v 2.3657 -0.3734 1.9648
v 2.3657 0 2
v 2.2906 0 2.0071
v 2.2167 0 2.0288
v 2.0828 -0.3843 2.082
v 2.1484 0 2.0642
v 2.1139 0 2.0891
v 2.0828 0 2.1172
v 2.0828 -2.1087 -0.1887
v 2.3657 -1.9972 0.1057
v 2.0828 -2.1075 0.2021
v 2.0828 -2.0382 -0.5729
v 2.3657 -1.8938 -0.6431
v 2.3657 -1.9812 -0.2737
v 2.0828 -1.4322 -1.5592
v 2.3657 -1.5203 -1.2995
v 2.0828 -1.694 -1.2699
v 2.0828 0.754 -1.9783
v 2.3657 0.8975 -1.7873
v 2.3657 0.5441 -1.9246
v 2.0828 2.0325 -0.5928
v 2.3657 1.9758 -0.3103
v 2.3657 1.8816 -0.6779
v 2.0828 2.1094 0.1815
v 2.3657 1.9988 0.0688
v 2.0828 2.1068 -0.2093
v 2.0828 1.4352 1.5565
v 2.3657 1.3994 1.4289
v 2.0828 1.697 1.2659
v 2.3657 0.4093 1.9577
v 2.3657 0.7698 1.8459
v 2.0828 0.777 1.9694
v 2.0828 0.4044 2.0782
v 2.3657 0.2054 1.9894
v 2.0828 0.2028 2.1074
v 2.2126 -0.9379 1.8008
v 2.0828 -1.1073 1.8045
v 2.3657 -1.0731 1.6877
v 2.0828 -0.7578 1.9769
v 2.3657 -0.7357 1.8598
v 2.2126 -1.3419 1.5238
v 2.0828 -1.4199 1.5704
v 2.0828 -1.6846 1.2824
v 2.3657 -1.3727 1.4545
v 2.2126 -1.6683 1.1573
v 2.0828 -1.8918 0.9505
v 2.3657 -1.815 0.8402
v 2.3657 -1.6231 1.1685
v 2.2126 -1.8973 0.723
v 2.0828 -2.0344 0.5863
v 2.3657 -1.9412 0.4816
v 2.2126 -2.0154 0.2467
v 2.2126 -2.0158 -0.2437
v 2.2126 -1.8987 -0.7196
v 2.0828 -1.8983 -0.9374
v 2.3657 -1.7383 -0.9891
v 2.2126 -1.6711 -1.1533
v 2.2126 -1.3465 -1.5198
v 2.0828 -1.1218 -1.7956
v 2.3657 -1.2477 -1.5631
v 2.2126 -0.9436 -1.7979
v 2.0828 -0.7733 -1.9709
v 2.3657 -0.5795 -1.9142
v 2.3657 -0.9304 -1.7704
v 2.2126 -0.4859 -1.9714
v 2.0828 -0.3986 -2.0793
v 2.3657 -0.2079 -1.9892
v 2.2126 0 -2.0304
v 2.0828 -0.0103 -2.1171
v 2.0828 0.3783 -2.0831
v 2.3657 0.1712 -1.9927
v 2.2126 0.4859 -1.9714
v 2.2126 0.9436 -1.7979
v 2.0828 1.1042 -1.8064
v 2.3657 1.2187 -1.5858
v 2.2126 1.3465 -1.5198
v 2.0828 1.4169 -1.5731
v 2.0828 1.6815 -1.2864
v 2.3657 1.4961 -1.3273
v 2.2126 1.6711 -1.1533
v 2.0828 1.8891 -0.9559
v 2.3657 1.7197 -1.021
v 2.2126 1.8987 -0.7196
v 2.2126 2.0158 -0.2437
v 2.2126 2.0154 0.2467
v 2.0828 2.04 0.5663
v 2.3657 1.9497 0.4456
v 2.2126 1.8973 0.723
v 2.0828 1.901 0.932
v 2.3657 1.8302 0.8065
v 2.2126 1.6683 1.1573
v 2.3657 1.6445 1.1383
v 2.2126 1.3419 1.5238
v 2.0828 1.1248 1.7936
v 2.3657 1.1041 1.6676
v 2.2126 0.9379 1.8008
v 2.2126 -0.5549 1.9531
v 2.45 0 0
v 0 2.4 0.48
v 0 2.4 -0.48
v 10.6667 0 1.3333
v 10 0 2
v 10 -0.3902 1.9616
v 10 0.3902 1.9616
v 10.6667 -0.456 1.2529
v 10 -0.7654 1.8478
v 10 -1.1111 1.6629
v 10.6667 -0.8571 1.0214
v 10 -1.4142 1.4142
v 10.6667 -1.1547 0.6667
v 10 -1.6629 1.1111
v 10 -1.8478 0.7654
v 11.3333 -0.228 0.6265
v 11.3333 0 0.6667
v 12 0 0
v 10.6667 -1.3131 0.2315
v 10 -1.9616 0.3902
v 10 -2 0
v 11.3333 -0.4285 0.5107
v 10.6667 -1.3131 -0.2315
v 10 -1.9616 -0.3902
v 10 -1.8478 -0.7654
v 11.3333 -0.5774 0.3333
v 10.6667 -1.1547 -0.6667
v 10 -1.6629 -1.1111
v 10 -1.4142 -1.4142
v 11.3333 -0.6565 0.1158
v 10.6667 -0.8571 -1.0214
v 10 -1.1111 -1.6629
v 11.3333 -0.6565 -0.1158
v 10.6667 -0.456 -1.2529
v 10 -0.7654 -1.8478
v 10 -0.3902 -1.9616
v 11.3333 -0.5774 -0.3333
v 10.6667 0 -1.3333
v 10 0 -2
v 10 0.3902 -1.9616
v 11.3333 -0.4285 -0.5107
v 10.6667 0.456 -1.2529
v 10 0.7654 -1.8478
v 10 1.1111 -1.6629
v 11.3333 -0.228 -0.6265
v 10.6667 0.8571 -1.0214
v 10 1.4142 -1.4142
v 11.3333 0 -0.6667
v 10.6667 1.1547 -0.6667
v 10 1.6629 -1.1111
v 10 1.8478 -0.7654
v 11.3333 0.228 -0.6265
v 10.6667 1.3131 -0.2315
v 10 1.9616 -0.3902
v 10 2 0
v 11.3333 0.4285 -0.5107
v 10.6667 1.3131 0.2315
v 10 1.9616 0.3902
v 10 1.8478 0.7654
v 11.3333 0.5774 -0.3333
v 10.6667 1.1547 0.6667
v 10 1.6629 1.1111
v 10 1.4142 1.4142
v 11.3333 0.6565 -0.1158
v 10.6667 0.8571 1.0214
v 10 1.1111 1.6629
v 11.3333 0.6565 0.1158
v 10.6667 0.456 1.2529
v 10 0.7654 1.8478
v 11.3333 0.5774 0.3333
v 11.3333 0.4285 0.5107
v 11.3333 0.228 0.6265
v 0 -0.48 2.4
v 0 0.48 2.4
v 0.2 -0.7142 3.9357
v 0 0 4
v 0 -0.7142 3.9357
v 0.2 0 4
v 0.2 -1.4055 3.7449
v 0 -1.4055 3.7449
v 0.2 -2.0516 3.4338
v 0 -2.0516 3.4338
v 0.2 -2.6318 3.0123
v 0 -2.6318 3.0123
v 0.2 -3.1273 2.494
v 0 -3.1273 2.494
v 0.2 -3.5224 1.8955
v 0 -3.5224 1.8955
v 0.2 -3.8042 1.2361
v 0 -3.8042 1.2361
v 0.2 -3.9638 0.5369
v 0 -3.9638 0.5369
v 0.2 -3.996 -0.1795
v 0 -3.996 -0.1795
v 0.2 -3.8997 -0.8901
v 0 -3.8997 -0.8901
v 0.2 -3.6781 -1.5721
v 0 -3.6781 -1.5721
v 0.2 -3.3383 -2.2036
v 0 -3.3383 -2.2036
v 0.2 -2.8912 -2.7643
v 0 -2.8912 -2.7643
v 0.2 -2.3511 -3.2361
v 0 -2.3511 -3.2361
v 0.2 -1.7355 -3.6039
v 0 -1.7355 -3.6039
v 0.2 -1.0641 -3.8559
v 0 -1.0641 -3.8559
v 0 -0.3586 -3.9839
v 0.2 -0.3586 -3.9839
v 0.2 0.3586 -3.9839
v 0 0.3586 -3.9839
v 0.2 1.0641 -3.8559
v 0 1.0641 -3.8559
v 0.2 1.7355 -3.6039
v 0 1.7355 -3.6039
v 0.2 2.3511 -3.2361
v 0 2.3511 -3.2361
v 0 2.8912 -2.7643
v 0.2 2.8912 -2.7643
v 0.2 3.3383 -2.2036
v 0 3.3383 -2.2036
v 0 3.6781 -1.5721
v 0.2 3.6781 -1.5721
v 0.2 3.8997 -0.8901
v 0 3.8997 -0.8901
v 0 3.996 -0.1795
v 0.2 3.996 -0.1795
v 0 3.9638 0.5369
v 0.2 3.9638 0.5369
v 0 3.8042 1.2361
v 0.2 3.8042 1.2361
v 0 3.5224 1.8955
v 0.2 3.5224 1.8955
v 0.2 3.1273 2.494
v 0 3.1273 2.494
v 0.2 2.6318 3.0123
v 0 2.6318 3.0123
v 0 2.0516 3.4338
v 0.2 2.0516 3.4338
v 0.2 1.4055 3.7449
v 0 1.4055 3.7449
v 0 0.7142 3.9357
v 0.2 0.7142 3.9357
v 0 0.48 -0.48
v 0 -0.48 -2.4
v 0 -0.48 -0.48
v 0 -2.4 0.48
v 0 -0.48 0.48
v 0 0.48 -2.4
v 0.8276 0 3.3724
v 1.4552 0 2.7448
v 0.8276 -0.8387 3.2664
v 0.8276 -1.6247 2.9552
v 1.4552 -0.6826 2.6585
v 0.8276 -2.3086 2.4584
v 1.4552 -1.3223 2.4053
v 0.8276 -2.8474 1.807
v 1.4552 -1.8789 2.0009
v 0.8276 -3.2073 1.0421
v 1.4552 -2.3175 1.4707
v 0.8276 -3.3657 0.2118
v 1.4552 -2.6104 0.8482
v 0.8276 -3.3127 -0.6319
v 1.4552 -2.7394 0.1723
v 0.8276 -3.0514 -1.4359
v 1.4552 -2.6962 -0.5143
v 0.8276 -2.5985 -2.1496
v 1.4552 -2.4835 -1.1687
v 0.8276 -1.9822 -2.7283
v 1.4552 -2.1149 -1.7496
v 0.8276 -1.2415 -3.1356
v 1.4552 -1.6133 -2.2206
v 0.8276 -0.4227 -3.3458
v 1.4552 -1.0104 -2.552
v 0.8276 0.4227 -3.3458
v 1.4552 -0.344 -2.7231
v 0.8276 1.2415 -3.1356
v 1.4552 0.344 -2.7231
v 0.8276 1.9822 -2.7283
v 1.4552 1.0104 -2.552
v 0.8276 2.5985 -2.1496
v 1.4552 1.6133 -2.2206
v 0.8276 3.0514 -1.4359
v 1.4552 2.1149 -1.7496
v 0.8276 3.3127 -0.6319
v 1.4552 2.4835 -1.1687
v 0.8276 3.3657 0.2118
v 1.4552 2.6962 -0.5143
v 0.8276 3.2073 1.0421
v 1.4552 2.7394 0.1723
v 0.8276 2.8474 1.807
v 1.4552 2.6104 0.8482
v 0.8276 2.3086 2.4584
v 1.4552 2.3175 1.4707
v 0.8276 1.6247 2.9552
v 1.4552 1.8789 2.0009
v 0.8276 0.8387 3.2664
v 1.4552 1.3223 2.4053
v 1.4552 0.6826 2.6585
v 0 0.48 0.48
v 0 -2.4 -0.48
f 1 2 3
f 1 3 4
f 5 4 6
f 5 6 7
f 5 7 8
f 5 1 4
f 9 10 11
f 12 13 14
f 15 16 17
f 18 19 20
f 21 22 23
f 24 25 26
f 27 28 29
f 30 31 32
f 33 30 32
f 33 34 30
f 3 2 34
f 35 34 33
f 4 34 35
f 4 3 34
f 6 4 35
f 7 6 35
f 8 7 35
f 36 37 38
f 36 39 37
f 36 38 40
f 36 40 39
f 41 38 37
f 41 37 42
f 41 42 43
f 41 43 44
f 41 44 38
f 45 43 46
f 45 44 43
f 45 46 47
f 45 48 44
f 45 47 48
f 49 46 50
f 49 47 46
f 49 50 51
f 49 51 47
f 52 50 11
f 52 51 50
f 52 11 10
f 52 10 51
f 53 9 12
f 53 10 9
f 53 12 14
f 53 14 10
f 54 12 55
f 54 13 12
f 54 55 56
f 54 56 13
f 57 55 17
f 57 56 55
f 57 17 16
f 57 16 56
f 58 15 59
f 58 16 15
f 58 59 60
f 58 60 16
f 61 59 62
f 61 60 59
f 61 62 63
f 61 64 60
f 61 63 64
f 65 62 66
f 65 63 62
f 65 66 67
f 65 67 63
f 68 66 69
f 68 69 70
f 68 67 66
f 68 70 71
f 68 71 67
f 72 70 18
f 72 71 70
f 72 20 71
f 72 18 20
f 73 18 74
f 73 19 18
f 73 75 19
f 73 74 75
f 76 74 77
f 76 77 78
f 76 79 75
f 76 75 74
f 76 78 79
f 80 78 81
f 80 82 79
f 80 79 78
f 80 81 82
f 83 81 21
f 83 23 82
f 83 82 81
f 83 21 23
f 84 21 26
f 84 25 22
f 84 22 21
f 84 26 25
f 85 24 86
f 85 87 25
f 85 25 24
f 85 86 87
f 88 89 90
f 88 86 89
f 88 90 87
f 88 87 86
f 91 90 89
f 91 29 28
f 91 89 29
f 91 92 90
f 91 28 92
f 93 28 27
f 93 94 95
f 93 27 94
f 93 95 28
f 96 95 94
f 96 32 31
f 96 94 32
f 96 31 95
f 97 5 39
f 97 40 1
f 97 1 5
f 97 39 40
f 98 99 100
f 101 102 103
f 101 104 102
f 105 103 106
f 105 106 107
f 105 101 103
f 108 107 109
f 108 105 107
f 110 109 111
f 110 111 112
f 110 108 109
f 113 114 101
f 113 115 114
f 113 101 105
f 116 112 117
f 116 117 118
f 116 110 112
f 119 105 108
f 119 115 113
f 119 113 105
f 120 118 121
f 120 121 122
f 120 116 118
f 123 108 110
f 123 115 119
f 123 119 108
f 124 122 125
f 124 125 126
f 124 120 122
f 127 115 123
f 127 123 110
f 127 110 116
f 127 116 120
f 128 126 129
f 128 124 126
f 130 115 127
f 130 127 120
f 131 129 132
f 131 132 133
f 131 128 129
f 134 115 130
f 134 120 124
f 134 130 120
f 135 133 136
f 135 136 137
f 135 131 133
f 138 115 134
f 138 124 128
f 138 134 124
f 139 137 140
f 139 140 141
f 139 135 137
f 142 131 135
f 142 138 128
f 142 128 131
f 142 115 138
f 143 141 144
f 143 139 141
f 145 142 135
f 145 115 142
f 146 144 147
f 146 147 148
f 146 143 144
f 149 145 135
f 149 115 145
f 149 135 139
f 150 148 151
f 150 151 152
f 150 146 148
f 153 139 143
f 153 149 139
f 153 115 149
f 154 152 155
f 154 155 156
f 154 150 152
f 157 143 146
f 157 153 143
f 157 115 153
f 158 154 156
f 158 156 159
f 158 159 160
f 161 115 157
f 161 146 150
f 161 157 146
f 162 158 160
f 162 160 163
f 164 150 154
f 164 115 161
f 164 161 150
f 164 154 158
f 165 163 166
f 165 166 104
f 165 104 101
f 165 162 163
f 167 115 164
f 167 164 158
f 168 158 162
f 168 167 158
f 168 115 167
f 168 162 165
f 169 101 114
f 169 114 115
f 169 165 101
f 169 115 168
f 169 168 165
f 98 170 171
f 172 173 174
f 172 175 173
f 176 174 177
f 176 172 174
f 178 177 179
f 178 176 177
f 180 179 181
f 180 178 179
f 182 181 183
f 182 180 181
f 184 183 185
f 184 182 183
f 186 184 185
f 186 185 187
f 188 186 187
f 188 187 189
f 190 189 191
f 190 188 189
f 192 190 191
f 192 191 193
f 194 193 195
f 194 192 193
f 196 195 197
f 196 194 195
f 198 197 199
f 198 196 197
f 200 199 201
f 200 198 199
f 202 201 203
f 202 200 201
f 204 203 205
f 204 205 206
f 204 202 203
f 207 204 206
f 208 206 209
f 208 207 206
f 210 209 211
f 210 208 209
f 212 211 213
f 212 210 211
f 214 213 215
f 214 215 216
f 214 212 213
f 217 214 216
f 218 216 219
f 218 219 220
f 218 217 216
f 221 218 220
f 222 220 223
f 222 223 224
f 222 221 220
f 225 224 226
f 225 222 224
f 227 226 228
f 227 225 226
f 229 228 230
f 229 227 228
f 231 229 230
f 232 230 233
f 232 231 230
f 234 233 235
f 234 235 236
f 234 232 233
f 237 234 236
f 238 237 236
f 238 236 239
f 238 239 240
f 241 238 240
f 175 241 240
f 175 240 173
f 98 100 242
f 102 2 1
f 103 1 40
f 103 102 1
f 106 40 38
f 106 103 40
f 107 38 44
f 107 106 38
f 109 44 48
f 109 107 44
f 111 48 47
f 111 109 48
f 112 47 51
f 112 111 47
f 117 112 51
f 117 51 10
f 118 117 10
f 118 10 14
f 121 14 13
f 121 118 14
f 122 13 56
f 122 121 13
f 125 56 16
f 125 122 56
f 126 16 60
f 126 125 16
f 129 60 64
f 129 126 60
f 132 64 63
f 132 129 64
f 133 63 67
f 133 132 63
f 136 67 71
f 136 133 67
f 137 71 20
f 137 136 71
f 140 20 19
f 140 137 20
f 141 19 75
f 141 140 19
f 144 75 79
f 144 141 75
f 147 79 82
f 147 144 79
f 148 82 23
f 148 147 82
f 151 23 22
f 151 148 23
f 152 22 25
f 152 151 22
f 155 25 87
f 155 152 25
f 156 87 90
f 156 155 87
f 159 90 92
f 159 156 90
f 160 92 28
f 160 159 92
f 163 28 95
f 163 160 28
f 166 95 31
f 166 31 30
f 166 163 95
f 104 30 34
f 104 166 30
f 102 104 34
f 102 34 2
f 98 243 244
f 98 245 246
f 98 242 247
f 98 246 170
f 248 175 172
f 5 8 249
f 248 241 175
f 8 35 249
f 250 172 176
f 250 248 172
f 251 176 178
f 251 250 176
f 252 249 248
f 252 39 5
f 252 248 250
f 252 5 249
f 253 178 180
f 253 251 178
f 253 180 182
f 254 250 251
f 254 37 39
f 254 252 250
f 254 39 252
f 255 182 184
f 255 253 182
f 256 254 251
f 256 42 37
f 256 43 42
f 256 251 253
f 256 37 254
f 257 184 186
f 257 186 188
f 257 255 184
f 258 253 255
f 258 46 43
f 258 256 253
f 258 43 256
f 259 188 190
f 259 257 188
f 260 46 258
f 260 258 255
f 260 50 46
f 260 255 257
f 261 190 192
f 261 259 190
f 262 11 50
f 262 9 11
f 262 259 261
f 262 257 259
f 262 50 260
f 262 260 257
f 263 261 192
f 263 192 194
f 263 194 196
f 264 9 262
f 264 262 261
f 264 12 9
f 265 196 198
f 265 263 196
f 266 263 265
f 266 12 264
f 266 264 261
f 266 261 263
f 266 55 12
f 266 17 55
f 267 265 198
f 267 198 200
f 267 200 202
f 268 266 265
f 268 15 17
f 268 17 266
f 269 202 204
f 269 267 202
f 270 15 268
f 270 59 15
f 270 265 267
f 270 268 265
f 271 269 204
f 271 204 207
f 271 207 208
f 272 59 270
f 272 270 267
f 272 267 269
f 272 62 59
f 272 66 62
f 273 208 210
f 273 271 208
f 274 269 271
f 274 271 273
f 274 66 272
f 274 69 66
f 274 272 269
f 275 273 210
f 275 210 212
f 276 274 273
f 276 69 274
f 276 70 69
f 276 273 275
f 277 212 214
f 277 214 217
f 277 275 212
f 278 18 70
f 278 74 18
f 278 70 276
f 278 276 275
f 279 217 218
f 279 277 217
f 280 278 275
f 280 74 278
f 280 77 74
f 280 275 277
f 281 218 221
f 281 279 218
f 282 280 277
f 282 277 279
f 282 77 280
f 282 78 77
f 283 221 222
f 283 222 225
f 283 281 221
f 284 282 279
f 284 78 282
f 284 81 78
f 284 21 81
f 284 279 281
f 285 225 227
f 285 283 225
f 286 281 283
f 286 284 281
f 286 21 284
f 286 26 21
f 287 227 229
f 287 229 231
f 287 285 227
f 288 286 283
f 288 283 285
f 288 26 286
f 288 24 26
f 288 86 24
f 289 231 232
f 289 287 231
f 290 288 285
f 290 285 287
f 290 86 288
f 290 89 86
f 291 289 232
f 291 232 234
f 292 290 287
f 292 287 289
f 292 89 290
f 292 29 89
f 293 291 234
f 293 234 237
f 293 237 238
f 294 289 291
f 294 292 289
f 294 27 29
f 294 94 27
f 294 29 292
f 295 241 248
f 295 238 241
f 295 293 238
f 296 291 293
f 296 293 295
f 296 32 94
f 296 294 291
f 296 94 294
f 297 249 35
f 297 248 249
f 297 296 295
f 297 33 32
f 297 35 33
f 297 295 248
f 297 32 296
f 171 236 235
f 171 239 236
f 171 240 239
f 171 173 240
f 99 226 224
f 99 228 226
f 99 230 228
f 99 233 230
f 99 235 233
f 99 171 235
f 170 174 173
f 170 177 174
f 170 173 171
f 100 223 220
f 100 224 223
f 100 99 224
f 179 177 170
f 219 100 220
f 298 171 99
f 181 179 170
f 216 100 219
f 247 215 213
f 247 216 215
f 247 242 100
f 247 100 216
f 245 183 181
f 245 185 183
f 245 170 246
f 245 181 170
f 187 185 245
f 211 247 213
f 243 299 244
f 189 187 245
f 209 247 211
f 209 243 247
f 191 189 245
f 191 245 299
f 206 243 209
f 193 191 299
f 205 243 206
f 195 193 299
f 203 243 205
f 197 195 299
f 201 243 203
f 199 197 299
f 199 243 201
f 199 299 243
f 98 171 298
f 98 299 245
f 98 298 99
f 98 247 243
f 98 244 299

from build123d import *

# Parameters (mm, degrees)
FILLET2_R = 0.4


with BuildPart() as part:
    # Sketch1 → Base (revolve)
    with BuildSketch(Plane(origin=(0, 0, 0), x_dir=(1, 0, 0), z_dir=(0, 1, 0)), mode=Mode.PRIVATE) as base_sk:
        Polygon((2.2, 2), (12, 2), (12, 0), (0, 0), (0, 4), (0.2, 4), align=None)
    revolve(base_sk.sketch.rotate(Axis((-6.506452013, 0, 0), (1, 0, 0)), 180), axis=Axis((-6.506452013, 0, 0), (1, 0, 0)))

    # Sketch3 → Cut-Revolve1 (revolve, cut)
    with BuildSketch(Plane.XY, mode=Mode.PRIVATE) as cut_revolve1_sk:
        Polygon((12.15755877, 0), (12.15755877, 20), (-8, 20), (12, 0), align=None)
    revolve(cut_revolve1_sk.sketch.rotate(Axis((4.883468835, 0, 0), (1, 0, 0)), 90), axis=Axis((4.883468835, 0, 0), (1, 0, 0)), mode=Mode.SUBTRACT)

    # Fillet2
    fillet2_edges = [part.edges().sort_by_distance(p)[0] for p in [
        (2.2, 0, -2),
    ]]
    fillet(fillet2_edges, radius=FILLET2_R)

    # Sketch2 → Cut-Loft1 section 0
    with BuildSketch(Plane(origin=(0, -0.680816871, 0.306758275), x_dir=(0, 0, 1), z_dir=(-1, 0, 0)), mode=Mode.PRIVATE) as cut_loft1_s0:
        with BuildLine():
            Line((-0.786758275, 1.160816871), (-2.706758275, 1.160816871))
            Line((-2.706758275, 1.160816871), (-2.706758275, 0.200816871))
            Line((-2.706758275, 0.200816871), (-0.786758275, 0.200816871))
            Line((-0.786758275, 0.200816871), (-0.786758275, -1.719183129))
            Line((-0.786758275, -1.719183129), (0.173241725, -1.719183129))
            Line((0.173241725, -1.719183129), (0.173241725, 0.200816871))
            Line((0.173241725, 0.200816871), (2.093241725, 0.200816871))
            Line((2.093241725, 0.200816871), (2.093241725, 1.160816871))
            Line((2.093241725, 1.160816871), (0.173241725, 1.160816871))
            Line((0.173241725, 1.160816871), (0.173241725, 3.080816871))
            Line((0.173241725, 3.080816871), (-0.786758275, 3.080816871))
            Line((-0.786758275, 3.080816871), (-0.786758275, 1.160816871))
        make_face()
    loft([cut_loft1_s0.sketch, Vertex(2.45, 0, 0)], mode=Mode.SUBTRACT)


solid = part.part
